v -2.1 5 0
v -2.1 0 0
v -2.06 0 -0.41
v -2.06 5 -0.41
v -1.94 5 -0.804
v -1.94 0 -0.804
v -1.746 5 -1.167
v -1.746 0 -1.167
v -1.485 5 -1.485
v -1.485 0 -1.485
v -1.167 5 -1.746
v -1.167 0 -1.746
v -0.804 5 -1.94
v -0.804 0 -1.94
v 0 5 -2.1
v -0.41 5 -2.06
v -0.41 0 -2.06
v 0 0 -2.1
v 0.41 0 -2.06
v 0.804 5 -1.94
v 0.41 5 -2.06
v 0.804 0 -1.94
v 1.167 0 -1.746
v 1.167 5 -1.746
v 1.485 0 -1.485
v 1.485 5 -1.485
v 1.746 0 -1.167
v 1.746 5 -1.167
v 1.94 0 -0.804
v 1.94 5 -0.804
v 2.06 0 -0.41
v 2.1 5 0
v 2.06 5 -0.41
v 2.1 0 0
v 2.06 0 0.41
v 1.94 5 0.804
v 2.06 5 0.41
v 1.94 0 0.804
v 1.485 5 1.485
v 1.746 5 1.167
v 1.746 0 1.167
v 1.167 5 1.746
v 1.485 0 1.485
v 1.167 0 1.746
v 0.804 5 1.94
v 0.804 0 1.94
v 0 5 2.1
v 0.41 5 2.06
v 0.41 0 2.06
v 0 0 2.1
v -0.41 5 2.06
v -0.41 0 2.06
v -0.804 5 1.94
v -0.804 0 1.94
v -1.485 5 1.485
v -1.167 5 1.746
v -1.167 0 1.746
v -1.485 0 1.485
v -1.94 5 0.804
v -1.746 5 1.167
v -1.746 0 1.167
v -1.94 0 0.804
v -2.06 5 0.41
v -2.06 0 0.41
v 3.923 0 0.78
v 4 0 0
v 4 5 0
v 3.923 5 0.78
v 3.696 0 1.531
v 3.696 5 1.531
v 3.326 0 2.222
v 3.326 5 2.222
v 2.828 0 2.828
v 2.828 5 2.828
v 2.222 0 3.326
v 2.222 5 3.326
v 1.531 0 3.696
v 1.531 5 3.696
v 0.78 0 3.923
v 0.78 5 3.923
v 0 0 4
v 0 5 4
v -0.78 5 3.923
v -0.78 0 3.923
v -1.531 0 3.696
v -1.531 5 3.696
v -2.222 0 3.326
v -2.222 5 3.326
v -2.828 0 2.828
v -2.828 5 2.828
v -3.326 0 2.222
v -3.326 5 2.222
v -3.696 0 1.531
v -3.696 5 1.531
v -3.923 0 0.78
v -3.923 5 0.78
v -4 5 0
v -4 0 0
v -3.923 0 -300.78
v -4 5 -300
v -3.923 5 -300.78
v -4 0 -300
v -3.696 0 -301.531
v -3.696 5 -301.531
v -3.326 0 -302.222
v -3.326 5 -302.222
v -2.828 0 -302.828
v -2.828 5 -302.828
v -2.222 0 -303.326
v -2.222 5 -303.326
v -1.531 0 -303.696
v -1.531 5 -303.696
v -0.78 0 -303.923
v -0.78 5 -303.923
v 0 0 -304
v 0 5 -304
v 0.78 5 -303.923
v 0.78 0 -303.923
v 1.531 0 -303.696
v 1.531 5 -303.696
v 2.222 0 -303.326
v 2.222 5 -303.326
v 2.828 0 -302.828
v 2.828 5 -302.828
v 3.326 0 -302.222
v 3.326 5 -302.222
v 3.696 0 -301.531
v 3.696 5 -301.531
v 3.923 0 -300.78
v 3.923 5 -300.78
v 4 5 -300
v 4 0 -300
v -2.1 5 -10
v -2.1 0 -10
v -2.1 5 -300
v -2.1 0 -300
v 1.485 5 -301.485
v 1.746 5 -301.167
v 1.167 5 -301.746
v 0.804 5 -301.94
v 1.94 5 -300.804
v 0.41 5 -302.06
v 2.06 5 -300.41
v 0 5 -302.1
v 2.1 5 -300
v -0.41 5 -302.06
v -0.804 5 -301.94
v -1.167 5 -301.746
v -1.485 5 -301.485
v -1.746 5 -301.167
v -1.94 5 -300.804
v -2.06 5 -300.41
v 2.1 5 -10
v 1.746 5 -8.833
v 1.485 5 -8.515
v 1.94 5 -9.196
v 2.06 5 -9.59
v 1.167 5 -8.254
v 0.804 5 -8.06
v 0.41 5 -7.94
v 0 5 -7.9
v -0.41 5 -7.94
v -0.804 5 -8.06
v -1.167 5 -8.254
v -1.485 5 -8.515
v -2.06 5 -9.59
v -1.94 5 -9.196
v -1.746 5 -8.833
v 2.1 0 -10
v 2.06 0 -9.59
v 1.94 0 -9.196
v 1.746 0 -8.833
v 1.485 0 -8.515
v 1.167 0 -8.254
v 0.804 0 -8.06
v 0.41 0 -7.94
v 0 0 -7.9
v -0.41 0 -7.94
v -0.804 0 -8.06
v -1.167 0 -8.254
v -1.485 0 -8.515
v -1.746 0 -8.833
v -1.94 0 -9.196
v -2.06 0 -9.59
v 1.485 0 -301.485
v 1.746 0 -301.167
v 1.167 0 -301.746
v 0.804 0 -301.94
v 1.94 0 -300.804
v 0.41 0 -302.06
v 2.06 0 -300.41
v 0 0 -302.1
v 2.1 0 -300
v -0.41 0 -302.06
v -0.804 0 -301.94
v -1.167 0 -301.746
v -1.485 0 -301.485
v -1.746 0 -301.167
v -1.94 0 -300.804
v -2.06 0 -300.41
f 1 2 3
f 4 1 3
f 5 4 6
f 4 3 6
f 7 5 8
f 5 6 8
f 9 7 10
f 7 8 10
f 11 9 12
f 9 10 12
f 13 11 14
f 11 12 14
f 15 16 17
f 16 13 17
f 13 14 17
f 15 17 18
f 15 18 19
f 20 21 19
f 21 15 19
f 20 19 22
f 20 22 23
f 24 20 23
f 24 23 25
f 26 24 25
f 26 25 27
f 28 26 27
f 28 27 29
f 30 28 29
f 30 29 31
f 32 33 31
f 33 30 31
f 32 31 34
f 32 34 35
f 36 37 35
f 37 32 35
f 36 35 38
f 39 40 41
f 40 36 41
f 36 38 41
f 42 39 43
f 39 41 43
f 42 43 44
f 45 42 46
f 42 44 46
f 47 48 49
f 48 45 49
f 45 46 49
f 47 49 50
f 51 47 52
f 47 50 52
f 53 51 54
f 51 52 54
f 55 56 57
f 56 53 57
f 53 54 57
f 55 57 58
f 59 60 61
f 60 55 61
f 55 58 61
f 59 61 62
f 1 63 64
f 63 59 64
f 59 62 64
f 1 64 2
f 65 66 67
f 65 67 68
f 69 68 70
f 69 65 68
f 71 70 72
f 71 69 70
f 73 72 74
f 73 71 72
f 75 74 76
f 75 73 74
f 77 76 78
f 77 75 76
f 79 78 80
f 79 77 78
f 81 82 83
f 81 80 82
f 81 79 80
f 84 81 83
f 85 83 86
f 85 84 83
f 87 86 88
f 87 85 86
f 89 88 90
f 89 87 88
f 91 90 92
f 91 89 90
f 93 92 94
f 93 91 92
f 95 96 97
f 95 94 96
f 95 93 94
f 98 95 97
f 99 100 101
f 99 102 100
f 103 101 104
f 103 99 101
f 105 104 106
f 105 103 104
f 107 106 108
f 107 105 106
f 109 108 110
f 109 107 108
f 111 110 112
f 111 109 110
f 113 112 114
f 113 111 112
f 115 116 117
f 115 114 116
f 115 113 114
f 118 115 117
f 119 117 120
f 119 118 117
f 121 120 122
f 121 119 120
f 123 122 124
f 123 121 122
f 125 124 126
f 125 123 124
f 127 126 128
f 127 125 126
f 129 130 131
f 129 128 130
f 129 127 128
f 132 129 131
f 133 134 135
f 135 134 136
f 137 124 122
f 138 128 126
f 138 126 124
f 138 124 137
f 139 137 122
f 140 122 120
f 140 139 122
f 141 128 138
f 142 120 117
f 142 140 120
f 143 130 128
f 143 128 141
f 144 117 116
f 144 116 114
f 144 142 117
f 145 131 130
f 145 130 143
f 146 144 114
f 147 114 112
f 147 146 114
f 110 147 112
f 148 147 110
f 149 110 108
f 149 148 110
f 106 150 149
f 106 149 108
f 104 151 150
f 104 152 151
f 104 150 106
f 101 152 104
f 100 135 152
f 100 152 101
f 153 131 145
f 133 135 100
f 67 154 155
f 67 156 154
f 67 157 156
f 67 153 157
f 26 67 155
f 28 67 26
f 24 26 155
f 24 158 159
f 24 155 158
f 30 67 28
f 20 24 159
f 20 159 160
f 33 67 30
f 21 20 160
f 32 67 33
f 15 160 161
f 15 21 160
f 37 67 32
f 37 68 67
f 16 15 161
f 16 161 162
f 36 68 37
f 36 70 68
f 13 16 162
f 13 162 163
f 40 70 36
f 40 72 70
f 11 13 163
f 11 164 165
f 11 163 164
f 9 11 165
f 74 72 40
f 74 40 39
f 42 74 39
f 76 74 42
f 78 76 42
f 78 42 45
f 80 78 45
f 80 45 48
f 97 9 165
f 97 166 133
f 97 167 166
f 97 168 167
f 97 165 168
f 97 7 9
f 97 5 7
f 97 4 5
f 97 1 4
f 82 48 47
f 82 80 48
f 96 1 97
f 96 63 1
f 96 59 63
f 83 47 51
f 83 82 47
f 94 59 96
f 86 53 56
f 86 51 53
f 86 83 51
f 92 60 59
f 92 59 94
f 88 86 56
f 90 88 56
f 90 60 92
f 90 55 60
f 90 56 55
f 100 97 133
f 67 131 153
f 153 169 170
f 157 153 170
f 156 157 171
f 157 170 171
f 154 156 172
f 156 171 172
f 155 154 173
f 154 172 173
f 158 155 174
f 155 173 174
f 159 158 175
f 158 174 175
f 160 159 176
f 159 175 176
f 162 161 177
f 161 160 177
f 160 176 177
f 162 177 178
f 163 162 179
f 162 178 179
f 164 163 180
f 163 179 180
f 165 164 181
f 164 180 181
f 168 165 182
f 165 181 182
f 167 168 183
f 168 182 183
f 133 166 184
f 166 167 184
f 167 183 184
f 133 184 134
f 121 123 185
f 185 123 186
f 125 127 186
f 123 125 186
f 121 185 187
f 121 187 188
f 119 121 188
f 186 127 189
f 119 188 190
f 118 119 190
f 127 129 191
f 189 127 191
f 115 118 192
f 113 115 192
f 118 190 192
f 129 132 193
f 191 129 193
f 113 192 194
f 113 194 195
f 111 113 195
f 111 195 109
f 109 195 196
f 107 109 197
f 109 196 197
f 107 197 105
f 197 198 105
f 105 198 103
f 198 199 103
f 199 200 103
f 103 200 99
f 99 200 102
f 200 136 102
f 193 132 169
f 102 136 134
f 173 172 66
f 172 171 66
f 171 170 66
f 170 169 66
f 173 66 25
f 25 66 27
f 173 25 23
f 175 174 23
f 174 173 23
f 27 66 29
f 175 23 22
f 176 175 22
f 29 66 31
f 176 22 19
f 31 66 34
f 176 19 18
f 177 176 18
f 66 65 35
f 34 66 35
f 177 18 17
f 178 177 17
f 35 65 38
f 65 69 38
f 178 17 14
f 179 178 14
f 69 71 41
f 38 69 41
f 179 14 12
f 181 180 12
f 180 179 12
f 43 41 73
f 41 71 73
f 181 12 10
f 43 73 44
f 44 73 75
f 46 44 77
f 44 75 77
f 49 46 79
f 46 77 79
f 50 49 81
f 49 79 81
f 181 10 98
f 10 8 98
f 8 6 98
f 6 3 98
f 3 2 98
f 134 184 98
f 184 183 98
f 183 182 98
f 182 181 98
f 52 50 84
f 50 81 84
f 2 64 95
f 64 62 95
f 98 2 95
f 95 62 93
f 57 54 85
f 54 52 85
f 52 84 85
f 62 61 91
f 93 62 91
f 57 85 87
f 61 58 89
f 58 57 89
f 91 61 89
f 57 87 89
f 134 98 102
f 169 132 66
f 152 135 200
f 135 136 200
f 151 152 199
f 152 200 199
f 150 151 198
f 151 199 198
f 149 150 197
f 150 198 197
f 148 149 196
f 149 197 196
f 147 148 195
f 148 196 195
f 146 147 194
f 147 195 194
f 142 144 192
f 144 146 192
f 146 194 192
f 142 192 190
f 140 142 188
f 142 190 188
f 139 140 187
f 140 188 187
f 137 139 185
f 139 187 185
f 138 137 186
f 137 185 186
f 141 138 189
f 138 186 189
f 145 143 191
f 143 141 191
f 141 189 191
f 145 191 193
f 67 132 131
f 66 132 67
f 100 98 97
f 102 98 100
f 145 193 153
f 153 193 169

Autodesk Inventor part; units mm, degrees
ref_plane "XZ Plane" through (0, 0, 0) normal (0, 1, 0) x (-1, 0, 0)
sketch "Sketch1" plane through (0, 0, 0) normal (0, 1, 0) x (-1, 0, 0)
  line L0 (0, 0) -> (0, -300) construction
  line L1 (4, 0) -> (4, -300)
  line L2 (-4, -300) -> (-4, 0)
  arc A0 (4, 0) -> (-4, 0) centre (0, 0) ccw
  arc A1 (-4, -300) -> (4, -300) centre (0, -300) ccw
  circle A2 centre (0, 0) radius 2.1
  line L3 (0, -10) -> (0, -300) construction
  line L4 (2.1, -10) -> (2.1, -300)
  line L5 (-2.1, -300) -> (-2.1, -10)
  arc A3 (2.1, -10) -> (-2.1, -10) centre (0, -10) ccw
  arc A4 (-2.1, -300) -> (2.1, -300) centre (0, -300) ccw
  point P0 (0, -150)
  point P1 (0, -155)
  dimension "d0" = 8
  dimension "d1" = 300
  dimension "d2" = 4.2
  dimension "d3" = 4.2
  dimension "d4" = 10
extrude "Extrusion1" add sketch "Sketch1" along normal blind 5
